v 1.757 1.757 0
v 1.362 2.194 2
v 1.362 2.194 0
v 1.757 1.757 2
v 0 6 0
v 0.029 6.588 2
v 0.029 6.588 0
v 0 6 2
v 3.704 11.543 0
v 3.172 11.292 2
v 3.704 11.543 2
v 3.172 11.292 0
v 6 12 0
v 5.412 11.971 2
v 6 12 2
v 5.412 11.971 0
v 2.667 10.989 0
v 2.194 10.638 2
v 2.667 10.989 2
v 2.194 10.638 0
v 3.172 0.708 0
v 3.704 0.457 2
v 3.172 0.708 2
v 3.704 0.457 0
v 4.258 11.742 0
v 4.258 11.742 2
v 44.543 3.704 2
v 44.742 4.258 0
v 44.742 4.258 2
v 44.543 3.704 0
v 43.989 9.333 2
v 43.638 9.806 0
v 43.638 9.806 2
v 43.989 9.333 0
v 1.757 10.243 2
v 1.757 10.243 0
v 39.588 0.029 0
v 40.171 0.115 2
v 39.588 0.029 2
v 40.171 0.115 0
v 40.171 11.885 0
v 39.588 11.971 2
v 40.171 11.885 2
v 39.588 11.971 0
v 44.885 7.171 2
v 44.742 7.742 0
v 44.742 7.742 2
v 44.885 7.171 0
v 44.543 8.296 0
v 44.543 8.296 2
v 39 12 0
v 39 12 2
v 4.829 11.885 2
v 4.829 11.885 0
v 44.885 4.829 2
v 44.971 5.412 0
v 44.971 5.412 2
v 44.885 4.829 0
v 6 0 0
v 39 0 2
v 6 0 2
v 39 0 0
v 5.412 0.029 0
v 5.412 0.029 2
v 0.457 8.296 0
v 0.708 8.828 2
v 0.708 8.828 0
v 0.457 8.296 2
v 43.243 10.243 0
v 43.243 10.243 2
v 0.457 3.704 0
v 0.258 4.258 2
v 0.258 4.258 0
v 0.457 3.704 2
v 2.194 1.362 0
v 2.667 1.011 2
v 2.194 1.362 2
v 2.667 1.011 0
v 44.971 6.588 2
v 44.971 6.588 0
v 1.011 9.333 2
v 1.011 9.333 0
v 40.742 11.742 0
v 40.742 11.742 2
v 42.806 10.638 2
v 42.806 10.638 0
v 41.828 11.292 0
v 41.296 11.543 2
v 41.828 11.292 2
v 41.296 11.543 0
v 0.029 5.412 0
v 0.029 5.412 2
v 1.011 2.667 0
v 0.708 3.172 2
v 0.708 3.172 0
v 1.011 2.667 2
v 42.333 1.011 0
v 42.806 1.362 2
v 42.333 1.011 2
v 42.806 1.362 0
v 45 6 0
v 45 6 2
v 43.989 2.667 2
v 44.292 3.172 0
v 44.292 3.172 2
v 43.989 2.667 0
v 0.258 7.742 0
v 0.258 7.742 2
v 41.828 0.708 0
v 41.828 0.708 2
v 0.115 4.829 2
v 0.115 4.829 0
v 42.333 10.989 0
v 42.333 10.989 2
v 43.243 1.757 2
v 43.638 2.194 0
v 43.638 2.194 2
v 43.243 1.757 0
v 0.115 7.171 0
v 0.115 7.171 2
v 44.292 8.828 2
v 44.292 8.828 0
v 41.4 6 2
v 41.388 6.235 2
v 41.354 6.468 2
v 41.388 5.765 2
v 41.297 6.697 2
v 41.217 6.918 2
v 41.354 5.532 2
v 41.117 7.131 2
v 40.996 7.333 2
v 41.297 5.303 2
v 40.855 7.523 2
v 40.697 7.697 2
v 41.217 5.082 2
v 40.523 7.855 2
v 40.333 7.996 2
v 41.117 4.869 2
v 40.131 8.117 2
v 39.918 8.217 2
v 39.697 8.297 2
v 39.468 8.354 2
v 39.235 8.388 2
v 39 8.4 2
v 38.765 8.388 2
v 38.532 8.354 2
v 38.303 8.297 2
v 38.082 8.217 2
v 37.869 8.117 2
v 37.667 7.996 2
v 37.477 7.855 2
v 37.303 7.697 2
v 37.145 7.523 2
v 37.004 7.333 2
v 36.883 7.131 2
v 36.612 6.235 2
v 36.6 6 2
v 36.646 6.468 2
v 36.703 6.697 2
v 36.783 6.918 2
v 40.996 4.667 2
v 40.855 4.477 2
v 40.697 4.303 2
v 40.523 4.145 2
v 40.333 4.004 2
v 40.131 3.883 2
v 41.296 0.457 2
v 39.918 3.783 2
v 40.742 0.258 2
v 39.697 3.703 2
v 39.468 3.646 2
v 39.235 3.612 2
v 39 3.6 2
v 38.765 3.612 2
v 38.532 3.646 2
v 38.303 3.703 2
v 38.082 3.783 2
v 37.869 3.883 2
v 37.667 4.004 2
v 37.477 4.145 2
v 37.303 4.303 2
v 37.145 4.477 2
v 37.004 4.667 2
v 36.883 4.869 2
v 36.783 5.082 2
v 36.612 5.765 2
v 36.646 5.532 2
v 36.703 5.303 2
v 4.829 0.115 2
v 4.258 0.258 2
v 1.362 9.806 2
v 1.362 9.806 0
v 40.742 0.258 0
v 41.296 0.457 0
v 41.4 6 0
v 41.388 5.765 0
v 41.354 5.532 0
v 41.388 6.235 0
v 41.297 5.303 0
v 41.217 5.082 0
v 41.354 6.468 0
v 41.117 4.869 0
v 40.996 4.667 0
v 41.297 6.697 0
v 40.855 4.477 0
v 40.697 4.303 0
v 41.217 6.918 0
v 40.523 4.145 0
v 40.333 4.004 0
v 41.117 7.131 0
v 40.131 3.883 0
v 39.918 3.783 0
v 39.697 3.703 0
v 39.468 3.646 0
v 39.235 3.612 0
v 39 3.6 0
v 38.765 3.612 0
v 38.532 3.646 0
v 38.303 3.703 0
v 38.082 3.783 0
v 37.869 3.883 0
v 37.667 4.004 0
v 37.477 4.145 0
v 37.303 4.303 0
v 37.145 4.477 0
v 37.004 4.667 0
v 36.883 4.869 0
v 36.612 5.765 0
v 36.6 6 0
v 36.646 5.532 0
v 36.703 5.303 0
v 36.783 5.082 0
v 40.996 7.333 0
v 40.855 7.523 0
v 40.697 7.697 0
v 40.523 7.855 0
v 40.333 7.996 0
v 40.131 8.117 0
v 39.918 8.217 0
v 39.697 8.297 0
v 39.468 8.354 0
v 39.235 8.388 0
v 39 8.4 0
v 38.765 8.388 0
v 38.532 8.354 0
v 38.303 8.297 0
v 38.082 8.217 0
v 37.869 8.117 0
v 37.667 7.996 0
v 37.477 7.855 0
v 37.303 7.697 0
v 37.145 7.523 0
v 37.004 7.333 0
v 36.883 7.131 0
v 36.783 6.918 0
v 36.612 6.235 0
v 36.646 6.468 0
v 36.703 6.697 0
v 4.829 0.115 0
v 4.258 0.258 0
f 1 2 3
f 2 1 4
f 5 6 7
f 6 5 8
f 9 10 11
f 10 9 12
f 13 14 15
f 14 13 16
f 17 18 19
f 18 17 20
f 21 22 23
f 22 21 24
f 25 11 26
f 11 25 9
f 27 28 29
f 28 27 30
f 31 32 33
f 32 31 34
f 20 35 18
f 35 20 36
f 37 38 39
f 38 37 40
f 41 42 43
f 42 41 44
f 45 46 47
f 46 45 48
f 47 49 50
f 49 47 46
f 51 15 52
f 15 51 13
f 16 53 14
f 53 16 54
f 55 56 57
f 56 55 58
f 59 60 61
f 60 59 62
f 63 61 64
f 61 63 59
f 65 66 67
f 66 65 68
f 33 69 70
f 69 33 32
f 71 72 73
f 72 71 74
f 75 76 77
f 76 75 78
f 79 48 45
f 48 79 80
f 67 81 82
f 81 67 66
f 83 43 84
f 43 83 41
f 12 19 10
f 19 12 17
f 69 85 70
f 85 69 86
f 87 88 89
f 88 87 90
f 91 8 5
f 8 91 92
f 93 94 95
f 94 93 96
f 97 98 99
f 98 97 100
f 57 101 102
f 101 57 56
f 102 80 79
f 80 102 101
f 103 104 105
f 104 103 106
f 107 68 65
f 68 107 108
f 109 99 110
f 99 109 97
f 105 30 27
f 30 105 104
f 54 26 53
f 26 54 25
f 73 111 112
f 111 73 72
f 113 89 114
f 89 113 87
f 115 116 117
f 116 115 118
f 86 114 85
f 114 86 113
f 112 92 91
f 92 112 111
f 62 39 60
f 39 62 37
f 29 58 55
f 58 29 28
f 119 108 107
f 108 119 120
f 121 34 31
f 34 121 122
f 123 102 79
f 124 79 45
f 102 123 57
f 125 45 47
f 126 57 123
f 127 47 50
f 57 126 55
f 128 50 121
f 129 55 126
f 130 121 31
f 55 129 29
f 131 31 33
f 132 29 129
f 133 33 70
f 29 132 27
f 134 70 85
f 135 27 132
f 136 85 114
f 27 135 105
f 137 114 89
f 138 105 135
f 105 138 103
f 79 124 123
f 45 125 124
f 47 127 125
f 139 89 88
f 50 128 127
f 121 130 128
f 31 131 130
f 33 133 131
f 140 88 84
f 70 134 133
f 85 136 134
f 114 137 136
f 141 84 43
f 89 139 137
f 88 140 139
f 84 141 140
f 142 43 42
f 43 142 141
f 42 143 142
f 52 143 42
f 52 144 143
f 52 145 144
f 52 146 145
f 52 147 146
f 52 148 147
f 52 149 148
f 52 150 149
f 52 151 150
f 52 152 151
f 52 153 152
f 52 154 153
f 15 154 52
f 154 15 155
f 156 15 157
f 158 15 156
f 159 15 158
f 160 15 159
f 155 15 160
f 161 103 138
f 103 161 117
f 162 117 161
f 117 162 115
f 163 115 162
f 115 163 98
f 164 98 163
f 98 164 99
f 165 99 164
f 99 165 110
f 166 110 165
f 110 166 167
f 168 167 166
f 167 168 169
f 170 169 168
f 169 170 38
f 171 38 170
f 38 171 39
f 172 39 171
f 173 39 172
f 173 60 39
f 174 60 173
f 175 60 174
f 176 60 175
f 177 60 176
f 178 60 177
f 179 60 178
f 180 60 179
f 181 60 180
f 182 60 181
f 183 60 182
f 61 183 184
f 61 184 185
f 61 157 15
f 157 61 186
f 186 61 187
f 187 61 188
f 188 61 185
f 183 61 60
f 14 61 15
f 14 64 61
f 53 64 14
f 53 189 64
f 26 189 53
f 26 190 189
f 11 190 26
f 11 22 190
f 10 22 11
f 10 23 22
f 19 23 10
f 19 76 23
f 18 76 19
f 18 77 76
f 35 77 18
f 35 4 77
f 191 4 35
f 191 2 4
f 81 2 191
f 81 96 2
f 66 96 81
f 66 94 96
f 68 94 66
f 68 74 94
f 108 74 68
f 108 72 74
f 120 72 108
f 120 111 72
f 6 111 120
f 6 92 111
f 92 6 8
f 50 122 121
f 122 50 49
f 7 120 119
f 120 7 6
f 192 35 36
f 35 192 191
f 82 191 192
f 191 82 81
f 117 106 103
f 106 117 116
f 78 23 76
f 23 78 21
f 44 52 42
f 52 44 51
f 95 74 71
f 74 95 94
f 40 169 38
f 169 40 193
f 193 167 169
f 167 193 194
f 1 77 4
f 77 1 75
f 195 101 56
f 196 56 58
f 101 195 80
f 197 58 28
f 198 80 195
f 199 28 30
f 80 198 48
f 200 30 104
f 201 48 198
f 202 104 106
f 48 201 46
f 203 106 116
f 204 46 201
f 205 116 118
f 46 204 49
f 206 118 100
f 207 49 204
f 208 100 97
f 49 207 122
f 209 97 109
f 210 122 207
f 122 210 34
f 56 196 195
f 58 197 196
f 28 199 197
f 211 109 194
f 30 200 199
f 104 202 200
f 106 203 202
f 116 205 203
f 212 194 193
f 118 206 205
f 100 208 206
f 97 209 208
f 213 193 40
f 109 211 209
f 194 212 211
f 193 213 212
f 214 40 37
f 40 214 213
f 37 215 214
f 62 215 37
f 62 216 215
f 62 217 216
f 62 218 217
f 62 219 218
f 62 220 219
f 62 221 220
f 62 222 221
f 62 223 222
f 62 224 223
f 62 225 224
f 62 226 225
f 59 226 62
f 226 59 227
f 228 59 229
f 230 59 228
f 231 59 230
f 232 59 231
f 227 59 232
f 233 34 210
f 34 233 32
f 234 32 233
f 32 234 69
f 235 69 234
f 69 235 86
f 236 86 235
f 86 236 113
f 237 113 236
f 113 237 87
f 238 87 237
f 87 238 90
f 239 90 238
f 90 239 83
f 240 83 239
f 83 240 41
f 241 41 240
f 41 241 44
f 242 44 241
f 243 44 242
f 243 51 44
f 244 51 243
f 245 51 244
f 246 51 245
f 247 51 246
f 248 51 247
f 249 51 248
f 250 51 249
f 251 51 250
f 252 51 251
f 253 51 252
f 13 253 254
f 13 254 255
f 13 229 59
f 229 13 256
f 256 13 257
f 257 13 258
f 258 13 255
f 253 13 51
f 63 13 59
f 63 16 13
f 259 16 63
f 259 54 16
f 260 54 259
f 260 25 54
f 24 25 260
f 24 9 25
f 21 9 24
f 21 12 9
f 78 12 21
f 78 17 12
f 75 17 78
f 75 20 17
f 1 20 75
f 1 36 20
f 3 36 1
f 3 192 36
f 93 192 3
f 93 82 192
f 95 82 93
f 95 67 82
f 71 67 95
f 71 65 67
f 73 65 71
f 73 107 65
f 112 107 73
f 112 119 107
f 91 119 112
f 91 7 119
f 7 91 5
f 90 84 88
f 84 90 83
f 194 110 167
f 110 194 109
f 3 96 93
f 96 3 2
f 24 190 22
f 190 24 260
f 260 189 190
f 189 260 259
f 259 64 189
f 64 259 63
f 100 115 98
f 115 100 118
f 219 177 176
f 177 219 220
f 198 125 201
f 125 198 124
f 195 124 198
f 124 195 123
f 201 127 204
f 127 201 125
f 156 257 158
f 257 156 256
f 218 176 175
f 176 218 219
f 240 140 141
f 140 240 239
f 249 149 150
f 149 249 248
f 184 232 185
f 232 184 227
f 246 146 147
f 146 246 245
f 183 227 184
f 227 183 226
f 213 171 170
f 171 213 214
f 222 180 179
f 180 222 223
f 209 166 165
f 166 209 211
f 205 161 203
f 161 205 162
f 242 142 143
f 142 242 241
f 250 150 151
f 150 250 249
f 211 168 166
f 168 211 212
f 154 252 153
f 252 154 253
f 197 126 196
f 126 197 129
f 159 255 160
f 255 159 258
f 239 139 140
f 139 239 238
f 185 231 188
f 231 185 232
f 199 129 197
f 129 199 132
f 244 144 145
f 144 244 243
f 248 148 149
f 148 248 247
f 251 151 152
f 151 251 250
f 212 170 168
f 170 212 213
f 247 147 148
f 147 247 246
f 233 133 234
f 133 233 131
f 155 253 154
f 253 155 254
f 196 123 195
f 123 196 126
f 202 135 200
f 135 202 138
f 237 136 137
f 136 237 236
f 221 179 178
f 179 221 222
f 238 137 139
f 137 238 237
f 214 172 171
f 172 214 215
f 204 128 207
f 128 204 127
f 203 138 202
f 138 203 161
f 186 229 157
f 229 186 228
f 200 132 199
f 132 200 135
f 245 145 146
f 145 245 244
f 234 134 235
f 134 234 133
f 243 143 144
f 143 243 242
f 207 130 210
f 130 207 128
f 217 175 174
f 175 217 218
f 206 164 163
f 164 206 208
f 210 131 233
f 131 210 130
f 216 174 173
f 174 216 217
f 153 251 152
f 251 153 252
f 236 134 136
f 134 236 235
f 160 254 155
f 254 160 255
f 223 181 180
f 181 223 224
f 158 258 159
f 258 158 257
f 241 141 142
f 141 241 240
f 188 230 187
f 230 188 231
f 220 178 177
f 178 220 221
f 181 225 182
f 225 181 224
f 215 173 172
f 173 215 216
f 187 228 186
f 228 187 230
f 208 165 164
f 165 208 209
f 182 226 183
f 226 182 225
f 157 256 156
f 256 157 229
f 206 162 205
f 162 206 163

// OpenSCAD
/*
    Parametric M4 rounded tab
    -----------------------------------------
    Small pill-shaped tab with a loose M4 clearance hole near one end.

    Orientation:
      XY = tab outline
      Z  = tab thickness
      Z = 0 is the print-bed face
*/


/* [Tab size] */

tab_width = 45;
tab_height = 12;
tab_thickness = 2;


/* [Screw hole] */

// Loose M4 clearance hole; no threading expected here.
screw_hole_diameter = 4.8;

// Distance from the right end of the tab to the screw-hole center.
// Use tab_height / 2 to center the hole in the rounded end.
screw_hole_center_from_right_edge = tab_height / 2;


/* [Rendering] */

$fn = 64;
epsilon = 0.1;


tab_end_radius = tab_height / 2;
screw_hole_x = tab_width - screw_hole_center_from_right_edge;
screw_hole_y = tab_height / 2;


module rounded_tab_outline() {
    hull() {
        translate([
            tab_end_radius,
            tab_end_radius
        ])
        circle(r = tab_end_radius);

        translate([
            tab_width - tab_end_radius,
            tab_end_radius
        ])
        circle(r = tab_end_radius);
    }
}


module screw_clearance_hole() {
    translate([
        screw_hole_x,
        screw_hole_y,
        -epsilon
    ])
    cylinder(
        d = screw_hole_diameter,
        h = tab_thickness + 2 * epsilon
    );
}


module rounded_tab() {
    difference() {
        linear_extrude(height = tab_thickness)
        rounded_tab_outline();

        screw_clearance_hole();
    }
}


assert(tab_width > 0, "tab_width must be positive");
assert(tab_height > 0, "tab_height must be positive");
assert(tab_thickness > 0, "tab_thickness must be positive");
assert(
    tab_width >= tab_height,
    "tab_width must be at least tab_height for fully rounded ends"
);
assert(screw_hole_diameter > 0, "screw_hole_diameter must be positive");
assert(
    screw_hole_diameter < tab_height,
    "screw_hole_diameter must be smaller than tab_height"
);
assert(
    screw_hole_center_from_right_edge >= screw_hole_diameter / 2,
    "Screw hole would break through the right end"
);
assert(
    screw_hole_center_from_right_edge <= tab_width - screw_hole_diameter / 2,
    "Screw hole would break through the left end"
);

rounded_tab();
